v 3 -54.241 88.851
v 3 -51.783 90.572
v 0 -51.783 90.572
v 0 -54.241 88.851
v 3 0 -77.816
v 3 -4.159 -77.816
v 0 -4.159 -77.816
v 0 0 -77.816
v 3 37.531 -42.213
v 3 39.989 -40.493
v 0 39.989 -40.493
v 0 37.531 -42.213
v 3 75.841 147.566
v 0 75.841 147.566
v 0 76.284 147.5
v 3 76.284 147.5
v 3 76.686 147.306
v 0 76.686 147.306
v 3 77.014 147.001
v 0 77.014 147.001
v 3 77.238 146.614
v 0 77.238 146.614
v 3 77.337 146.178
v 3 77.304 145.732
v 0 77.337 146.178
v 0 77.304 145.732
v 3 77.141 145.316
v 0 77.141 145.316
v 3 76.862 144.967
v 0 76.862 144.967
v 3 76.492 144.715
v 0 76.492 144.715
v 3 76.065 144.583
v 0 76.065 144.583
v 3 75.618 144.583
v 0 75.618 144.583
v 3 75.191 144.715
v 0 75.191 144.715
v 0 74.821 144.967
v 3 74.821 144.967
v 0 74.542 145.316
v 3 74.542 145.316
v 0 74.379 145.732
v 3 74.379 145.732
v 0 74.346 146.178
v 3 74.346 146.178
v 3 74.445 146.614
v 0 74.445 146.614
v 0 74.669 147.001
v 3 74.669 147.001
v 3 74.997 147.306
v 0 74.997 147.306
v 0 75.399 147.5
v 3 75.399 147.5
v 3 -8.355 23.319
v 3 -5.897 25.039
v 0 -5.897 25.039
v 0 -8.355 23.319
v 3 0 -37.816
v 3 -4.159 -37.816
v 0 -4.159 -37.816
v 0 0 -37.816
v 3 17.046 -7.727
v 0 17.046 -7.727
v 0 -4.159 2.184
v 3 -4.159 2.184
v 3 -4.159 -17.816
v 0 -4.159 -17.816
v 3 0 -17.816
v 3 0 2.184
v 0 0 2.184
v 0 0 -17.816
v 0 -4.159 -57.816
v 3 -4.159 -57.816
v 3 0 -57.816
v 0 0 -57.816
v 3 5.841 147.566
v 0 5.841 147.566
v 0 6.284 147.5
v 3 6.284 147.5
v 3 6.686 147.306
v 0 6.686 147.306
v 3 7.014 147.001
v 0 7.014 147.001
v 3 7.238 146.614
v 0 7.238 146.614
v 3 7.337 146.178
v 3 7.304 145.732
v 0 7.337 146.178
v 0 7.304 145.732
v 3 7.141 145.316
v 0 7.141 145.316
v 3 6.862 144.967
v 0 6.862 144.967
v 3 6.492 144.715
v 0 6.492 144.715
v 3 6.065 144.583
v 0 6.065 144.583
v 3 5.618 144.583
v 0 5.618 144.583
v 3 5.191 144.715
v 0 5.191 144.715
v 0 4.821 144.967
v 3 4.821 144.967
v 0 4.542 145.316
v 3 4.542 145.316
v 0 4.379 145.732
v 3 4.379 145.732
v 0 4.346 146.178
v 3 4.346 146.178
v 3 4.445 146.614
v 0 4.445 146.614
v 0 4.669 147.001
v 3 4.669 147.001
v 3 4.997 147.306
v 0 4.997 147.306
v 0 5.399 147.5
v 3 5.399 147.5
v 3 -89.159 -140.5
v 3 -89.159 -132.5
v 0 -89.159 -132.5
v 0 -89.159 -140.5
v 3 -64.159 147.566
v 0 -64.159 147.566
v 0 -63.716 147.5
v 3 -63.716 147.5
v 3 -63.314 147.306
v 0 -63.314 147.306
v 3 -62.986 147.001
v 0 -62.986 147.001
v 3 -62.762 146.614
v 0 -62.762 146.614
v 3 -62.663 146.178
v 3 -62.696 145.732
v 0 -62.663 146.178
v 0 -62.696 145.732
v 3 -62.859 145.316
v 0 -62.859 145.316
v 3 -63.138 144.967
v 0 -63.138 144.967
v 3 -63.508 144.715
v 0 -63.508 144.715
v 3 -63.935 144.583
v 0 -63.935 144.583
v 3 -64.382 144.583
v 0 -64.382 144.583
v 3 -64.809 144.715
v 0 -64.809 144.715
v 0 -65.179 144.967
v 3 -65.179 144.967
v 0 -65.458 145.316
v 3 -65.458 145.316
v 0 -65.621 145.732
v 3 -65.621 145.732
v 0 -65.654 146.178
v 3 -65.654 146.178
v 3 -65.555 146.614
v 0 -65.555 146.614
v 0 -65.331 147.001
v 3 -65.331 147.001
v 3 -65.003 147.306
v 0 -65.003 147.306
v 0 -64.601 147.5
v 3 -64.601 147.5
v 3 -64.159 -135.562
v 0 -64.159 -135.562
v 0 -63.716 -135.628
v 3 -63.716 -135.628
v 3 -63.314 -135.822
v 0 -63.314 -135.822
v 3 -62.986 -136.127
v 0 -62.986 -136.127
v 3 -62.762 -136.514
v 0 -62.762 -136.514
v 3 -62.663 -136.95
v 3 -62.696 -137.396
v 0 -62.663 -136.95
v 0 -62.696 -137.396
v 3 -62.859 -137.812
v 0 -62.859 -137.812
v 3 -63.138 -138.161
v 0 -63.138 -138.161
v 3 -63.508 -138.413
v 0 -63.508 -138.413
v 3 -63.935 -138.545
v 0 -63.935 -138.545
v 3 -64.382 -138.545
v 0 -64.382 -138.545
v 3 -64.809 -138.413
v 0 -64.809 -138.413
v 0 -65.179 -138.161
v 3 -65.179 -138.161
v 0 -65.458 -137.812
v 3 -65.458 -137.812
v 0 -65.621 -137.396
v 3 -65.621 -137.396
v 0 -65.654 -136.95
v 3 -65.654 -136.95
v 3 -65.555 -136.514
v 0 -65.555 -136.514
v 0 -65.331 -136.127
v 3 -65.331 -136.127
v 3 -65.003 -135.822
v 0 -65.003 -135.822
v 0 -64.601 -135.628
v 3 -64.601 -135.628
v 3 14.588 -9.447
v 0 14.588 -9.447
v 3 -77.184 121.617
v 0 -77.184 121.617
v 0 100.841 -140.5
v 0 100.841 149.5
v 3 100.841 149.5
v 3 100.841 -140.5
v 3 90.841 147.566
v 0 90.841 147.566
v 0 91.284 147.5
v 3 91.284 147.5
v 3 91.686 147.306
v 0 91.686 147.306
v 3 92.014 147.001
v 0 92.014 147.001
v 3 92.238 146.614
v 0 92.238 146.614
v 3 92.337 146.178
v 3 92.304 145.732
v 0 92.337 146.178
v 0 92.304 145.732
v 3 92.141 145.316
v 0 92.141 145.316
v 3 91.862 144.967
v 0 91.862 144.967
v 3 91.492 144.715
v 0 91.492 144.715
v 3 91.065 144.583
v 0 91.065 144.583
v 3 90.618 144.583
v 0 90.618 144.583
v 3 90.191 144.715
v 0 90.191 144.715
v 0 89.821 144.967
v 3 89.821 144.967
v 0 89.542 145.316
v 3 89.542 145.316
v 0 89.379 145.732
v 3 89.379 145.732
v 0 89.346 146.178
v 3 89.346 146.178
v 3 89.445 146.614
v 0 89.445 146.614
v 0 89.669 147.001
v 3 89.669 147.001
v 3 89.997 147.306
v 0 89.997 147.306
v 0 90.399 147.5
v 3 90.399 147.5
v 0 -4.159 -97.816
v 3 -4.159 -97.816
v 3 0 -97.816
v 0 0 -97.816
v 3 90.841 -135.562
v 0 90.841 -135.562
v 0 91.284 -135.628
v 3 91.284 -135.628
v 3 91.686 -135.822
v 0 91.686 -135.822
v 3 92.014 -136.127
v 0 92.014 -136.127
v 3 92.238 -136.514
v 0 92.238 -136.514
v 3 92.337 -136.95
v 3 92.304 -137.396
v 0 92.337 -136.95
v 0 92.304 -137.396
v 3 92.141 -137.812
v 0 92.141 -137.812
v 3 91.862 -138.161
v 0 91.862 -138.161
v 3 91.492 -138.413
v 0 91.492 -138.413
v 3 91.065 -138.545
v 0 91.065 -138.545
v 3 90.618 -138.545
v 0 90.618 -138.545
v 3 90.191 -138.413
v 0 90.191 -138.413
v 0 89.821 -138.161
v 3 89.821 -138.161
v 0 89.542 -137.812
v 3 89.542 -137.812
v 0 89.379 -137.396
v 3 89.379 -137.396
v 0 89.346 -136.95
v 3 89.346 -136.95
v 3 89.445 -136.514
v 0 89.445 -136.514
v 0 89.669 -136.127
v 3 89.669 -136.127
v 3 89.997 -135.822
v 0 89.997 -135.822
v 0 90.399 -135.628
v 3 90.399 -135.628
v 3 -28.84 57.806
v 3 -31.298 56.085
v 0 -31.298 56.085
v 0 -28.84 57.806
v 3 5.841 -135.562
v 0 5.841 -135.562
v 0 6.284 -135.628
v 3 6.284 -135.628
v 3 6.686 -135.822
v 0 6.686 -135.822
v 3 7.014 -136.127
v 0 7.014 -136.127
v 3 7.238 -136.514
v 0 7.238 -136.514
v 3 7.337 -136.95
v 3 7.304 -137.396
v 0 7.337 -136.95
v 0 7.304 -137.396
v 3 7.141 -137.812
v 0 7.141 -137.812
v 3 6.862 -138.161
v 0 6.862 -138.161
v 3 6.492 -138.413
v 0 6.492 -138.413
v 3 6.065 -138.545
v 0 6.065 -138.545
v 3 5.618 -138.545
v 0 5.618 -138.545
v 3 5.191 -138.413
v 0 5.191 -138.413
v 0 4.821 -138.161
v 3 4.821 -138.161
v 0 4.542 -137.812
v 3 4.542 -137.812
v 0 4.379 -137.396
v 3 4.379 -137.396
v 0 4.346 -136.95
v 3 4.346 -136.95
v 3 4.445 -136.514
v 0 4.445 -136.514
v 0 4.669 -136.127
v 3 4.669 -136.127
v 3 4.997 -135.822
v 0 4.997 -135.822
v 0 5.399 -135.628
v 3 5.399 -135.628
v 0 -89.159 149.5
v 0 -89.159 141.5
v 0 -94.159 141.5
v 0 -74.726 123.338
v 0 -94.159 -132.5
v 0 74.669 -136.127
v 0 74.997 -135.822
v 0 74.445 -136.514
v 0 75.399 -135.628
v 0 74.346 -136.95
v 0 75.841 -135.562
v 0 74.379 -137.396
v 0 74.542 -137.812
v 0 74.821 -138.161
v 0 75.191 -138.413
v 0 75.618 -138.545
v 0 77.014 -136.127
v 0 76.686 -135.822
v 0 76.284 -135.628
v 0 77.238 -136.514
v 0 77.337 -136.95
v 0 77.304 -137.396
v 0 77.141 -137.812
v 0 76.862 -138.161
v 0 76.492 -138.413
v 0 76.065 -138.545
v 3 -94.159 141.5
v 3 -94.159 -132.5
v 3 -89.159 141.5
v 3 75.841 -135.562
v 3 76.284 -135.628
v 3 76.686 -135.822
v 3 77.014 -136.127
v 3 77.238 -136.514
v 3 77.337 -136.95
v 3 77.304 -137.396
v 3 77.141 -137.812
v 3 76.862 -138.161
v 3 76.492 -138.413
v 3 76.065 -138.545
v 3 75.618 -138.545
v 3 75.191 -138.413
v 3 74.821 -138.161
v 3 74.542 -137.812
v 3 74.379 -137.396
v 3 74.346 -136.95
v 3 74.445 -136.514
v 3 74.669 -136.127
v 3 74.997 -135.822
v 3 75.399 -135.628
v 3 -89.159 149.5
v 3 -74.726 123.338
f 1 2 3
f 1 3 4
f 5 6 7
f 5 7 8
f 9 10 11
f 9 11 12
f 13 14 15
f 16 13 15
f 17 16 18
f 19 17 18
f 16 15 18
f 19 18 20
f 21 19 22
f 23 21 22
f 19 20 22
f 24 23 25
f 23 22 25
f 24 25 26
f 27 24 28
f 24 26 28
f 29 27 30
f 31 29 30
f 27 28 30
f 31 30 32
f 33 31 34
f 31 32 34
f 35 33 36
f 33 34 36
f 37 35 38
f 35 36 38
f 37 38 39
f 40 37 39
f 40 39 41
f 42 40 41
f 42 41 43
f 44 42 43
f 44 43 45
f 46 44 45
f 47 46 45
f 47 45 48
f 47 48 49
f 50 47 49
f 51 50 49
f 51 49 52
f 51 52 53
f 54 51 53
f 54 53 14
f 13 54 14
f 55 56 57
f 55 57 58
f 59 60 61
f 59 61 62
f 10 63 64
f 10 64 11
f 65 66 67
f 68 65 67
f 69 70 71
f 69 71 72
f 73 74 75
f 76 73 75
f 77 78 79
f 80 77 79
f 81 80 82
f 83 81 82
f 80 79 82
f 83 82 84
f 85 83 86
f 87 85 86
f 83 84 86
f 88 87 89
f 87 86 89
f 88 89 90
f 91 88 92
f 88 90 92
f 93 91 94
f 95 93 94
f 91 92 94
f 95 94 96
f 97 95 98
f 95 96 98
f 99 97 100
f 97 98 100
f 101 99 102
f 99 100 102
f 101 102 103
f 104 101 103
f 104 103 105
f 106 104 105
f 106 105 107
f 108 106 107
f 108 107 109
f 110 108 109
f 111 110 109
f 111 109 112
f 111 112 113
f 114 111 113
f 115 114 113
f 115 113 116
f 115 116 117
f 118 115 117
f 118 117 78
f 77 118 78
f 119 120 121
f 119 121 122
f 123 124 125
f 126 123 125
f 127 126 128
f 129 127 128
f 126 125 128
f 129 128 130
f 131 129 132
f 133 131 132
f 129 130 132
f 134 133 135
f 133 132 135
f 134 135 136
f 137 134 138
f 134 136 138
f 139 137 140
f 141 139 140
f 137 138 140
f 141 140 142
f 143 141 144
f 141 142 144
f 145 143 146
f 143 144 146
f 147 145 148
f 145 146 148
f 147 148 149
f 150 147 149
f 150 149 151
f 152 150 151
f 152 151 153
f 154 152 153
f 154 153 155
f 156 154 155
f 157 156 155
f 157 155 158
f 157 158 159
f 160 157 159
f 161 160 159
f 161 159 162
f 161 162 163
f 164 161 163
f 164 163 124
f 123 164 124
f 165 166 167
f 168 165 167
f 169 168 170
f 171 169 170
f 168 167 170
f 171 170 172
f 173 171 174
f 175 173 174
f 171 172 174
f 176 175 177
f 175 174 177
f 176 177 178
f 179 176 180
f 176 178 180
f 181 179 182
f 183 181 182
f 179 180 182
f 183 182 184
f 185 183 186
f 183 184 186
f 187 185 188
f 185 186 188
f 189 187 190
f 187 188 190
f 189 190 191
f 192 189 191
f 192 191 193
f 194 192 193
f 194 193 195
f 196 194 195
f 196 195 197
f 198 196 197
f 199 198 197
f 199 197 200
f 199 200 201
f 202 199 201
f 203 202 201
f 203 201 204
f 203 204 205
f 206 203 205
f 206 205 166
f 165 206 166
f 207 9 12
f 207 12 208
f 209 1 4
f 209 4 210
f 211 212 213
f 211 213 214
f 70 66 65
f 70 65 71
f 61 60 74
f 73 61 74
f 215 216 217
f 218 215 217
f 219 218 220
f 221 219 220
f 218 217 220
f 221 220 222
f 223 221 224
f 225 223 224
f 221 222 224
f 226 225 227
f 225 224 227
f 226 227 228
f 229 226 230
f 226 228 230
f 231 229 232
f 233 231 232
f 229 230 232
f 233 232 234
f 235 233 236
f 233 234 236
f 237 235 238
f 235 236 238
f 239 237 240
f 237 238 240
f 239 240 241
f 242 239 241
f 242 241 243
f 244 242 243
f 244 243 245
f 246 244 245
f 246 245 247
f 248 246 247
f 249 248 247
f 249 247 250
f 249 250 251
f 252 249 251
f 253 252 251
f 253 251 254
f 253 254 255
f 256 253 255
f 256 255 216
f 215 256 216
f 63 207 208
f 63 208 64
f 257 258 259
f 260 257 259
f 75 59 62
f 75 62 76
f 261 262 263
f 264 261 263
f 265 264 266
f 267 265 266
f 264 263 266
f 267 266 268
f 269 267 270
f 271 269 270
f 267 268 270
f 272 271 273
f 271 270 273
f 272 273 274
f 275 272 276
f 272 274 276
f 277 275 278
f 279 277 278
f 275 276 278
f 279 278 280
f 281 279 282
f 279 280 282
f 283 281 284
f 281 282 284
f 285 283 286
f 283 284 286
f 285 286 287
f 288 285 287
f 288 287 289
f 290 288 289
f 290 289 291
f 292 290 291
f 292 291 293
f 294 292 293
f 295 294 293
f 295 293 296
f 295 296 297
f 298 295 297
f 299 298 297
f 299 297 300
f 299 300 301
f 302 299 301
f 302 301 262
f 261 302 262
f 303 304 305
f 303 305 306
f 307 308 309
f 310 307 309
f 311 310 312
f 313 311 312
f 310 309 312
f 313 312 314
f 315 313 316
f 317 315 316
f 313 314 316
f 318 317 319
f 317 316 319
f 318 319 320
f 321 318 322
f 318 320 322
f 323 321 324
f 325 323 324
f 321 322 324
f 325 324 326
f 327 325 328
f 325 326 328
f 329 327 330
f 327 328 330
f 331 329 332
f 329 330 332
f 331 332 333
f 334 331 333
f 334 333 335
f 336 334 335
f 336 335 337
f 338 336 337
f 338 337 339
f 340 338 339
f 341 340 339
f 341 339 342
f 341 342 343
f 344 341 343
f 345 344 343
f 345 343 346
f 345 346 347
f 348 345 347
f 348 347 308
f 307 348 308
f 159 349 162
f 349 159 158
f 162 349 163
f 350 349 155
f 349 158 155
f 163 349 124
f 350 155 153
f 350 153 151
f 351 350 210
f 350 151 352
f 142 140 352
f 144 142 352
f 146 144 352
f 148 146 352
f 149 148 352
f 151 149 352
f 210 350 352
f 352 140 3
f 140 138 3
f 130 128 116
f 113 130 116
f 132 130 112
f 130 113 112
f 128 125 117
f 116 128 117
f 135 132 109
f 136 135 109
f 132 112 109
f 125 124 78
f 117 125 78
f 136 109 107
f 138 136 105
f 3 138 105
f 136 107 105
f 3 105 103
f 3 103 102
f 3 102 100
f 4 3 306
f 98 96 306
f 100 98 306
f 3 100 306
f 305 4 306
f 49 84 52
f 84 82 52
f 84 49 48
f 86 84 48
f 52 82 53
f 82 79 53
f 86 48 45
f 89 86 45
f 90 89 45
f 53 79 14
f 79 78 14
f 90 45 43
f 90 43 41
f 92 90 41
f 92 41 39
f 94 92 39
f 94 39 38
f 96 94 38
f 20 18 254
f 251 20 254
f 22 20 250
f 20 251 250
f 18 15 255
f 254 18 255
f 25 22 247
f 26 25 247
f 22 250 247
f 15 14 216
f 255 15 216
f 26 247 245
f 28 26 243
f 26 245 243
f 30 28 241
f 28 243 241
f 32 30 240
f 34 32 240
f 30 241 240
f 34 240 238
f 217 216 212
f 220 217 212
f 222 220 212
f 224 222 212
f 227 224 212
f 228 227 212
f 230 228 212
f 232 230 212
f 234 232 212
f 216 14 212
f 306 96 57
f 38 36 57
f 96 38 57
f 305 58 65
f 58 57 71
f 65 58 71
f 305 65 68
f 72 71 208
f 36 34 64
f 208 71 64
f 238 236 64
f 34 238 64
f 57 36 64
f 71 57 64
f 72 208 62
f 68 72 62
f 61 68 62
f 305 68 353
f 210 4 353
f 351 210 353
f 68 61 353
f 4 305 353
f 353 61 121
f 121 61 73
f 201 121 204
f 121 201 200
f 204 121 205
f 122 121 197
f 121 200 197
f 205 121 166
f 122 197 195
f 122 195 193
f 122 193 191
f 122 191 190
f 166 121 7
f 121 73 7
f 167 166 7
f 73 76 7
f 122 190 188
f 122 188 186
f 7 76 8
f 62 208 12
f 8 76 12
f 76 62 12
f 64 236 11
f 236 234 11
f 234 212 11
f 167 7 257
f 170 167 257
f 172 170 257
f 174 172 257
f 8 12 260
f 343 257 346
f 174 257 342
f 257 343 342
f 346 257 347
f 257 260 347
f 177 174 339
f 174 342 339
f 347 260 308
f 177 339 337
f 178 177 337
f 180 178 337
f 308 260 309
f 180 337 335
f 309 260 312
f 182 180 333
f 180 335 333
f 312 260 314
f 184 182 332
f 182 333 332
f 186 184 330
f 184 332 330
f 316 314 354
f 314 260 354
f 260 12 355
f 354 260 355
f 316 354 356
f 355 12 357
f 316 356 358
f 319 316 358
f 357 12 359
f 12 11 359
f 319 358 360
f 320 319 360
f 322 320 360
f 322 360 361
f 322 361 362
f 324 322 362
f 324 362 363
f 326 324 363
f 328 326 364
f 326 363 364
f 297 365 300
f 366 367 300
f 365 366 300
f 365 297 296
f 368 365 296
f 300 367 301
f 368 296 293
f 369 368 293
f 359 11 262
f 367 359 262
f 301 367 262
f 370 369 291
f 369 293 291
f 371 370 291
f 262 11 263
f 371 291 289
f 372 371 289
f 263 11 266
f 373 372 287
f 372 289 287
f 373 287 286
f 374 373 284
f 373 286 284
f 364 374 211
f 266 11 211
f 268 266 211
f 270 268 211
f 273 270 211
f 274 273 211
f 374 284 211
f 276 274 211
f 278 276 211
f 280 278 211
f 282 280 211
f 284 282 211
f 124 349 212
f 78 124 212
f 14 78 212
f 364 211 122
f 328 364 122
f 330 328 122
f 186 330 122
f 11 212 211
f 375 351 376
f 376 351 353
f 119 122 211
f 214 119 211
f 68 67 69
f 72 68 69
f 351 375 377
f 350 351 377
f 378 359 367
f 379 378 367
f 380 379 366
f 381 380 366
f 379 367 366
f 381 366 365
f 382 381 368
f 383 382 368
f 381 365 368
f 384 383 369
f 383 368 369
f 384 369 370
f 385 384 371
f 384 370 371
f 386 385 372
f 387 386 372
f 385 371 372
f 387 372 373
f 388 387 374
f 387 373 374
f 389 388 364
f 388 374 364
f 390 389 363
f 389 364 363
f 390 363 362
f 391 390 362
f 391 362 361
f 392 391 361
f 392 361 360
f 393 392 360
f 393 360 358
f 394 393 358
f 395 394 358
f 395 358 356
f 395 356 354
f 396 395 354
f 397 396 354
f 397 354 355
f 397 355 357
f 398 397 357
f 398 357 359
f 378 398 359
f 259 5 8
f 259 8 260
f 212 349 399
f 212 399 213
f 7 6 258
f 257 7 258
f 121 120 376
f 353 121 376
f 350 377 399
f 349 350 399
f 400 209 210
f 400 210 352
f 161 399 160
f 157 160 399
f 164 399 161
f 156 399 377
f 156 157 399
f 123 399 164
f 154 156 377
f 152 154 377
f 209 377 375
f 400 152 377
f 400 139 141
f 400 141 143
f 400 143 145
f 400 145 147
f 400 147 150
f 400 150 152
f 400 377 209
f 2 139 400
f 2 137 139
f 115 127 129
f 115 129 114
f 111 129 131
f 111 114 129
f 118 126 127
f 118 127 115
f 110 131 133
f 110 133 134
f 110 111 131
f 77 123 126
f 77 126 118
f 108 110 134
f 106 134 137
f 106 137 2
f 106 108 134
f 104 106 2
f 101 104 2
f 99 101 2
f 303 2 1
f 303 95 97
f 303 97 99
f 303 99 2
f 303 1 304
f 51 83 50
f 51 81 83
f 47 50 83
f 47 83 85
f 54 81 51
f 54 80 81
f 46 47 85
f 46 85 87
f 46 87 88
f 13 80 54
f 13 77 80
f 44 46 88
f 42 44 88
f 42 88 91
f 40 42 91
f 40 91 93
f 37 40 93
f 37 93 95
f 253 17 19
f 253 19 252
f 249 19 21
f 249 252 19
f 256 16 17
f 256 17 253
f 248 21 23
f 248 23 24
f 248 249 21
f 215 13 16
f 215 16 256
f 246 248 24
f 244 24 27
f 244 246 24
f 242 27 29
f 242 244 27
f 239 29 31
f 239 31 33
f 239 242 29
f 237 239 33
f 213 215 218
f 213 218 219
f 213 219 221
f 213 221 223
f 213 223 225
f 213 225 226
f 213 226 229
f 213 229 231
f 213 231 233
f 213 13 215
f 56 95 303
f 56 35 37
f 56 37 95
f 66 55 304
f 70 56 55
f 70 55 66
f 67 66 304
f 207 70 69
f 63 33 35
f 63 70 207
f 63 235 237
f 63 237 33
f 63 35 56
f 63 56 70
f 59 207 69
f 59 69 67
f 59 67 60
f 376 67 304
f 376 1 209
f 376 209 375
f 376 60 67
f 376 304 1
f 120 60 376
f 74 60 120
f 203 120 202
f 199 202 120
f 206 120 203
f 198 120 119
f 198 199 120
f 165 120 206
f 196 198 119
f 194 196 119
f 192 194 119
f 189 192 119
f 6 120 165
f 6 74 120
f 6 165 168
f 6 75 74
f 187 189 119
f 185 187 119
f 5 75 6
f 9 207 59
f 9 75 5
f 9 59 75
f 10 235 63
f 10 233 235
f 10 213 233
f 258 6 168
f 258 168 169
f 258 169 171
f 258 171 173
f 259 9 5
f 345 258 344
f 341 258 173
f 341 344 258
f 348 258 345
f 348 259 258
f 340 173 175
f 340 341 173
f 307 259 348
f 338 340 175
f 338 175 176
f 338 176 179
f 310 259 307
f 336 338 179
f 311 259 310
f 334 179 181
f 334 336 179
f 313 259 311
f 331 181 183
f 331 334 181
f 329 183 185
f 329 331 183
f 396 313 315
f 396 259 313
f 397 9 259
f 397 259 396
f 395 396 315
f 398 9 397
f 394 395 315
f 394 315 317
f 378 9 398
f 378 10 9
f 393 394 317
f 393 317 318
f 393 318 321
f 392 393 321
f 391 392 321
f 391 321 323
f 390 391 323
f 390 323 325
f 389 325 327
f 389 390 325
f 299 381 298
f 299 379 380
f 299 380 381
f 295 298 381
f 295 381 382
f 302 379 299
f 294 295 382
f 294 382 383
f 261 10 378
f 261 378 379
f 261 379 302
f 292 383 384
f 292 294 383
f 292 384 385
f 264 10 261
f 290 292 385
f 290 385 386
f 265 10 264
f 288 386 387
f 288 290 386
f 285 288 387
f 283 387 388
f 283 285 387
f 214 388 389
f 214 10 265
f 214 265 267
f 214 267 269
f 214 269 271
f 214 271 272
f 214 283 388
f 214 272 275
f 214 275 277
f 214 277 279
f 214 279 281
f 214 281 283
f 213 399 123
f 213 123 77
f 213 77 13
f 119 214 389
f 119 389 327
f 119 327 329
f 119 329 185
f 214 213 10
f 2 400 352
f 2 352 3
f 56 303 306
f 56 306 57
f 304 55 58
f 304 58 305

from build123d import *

# Parameters (mm, degrees)
SKETCH1_W           = 290
SKETCH1_H           = 195
BOSS_EXTRUDE1_DEPTH = 3
CUT_EXTRUDE1_DEPTH  = 10
SKETCH3_R           = 1.5
CUT_EXTRUDE2_DEPTH  = 10
CUT_EXTRUDE3_DEPTH  = 10
SKETCH5_W           = 20
SKETCH5_H           = 4.158505531
CUT_EXTRUDE4_DEPTH  = 10


with BuildPart() as part:
    # Sketch1 → Boss-Extrude1 (new body)
    with BuildSketch(Plane(origin=(0, 0, 0), x_dir=(0, 0, -1), z_dir=(1, 0, 0))):
        with Locations((-4.5, 3.341494469)):
            Rectangle(SKETCH1_W, SKETCH1_H)
    extrude(amount=BOSS_EXTRUDE1_DEPTH)

    # Sketch2 → Cut-Extrude1 (cut)
    with BuildSketch(Plane(origin=(3, 0, 0), x_dir=(0, 0, -1), z_dir=(1, 0, 0))):
        Polygon((-141.5, -94.158505531), (-141.5, -89.158505531), (-159.427644911, -89.158505531), (-159.427644911, -110.995569774), (-141.5, -110.995569774), align=None)
        Polygon((132.5, -110.995569774), (132.5, -94.158505531), (132.5, -89.158505531), (150.427644911, -89.158505531), (150.427644911, -110.995569774), align=None)
    extrude(amount=-CUT_EXTRUDE1_DEPTH, mode=Mode.SUBTRACT)

    # Sketch3 → Cut-Extrude2 (cut)
    with BuildSketch(Plane.ZY):
        with Locations((146.066251174, -64.158505531)):
            Circle(SKETCH3_R)
        with Locations((-137.061834429, -64.158505531)):
            Circle(SKETCH3_R)
        with Locations((-137.061834429, 5.841494469)):
            Circle(SKETCH3_R)
        with Locations((146.066251174, 5.841494469)):
            Circle(SKETCH3_R)
        with Locations((-137.061834429, 75.841494469)):
            Circle(SKETCH3_R)
        with Locations((146.066251174, 75.841494469)):
            Circle(SKETCH3_R)
        with Locations((-137.061834429, 90.841494469)):
            Circle(SKETCH3_R)
        with Locations((146.066251174, 90.841494469)):
            Circle(SKETCH3_R)
    extrude(amount=-CUT_EXTRUDE2_DEPTH, mode=Mode.SUBTRACT)

    # Sketch4 → Cut-Extrude3 (cut)
    with BuildSketch(Plane(origin=(3, 0, 0), x_dir=(0, 0, -1), z_dir=(1, 0, 0))):
        Polygon((-123.337688423, -74.726407598), (-90.571606652, -51.783350144), (-88.850877343, -54.240806276), (-121.616959114, -77.18386373), align=None)
        Polygon((-57.80552488, -28.84029269), (-25.039443109, -5.897235235), (-23.3187138, -8.354691368), (-56.084795571, -31.297748822), align=None)
        Polygon((7.726638663, 17.045822219), (40.492720435, 39.988879673), (42.213449744, 37.53142354), (9.447367972, 14.588366086), align=None)
    extrude(amount=-CUT_EXTRUDE3_DEPTH, mode=Mode.SUBTRACT)

    # Sketch5 → Cut-Extrude4 (cut)
    with BuildSketch(Plane(origin=(3, 0, 0), x_dir=(0, 0, -1), z_dir=(1, 0, 0))):
        with Locations((7.816456388, -2.079252766)):
            Rectangle(SKETCH5_W, SKETCH5_H)
        with Locations((47.816456388, -2.079252766)):
            Rectangle(SKETCH5_W, SKETCH5_H)
        with Locations((87.816456388, -2.079252766)):
            Rectangle(SKETCH5_W, SKETCH5_H)
    extrude(amount=-CUT_EXTRUDE4_DEPTH, mode=Mode.SUBTRACT)


solid = part.part
